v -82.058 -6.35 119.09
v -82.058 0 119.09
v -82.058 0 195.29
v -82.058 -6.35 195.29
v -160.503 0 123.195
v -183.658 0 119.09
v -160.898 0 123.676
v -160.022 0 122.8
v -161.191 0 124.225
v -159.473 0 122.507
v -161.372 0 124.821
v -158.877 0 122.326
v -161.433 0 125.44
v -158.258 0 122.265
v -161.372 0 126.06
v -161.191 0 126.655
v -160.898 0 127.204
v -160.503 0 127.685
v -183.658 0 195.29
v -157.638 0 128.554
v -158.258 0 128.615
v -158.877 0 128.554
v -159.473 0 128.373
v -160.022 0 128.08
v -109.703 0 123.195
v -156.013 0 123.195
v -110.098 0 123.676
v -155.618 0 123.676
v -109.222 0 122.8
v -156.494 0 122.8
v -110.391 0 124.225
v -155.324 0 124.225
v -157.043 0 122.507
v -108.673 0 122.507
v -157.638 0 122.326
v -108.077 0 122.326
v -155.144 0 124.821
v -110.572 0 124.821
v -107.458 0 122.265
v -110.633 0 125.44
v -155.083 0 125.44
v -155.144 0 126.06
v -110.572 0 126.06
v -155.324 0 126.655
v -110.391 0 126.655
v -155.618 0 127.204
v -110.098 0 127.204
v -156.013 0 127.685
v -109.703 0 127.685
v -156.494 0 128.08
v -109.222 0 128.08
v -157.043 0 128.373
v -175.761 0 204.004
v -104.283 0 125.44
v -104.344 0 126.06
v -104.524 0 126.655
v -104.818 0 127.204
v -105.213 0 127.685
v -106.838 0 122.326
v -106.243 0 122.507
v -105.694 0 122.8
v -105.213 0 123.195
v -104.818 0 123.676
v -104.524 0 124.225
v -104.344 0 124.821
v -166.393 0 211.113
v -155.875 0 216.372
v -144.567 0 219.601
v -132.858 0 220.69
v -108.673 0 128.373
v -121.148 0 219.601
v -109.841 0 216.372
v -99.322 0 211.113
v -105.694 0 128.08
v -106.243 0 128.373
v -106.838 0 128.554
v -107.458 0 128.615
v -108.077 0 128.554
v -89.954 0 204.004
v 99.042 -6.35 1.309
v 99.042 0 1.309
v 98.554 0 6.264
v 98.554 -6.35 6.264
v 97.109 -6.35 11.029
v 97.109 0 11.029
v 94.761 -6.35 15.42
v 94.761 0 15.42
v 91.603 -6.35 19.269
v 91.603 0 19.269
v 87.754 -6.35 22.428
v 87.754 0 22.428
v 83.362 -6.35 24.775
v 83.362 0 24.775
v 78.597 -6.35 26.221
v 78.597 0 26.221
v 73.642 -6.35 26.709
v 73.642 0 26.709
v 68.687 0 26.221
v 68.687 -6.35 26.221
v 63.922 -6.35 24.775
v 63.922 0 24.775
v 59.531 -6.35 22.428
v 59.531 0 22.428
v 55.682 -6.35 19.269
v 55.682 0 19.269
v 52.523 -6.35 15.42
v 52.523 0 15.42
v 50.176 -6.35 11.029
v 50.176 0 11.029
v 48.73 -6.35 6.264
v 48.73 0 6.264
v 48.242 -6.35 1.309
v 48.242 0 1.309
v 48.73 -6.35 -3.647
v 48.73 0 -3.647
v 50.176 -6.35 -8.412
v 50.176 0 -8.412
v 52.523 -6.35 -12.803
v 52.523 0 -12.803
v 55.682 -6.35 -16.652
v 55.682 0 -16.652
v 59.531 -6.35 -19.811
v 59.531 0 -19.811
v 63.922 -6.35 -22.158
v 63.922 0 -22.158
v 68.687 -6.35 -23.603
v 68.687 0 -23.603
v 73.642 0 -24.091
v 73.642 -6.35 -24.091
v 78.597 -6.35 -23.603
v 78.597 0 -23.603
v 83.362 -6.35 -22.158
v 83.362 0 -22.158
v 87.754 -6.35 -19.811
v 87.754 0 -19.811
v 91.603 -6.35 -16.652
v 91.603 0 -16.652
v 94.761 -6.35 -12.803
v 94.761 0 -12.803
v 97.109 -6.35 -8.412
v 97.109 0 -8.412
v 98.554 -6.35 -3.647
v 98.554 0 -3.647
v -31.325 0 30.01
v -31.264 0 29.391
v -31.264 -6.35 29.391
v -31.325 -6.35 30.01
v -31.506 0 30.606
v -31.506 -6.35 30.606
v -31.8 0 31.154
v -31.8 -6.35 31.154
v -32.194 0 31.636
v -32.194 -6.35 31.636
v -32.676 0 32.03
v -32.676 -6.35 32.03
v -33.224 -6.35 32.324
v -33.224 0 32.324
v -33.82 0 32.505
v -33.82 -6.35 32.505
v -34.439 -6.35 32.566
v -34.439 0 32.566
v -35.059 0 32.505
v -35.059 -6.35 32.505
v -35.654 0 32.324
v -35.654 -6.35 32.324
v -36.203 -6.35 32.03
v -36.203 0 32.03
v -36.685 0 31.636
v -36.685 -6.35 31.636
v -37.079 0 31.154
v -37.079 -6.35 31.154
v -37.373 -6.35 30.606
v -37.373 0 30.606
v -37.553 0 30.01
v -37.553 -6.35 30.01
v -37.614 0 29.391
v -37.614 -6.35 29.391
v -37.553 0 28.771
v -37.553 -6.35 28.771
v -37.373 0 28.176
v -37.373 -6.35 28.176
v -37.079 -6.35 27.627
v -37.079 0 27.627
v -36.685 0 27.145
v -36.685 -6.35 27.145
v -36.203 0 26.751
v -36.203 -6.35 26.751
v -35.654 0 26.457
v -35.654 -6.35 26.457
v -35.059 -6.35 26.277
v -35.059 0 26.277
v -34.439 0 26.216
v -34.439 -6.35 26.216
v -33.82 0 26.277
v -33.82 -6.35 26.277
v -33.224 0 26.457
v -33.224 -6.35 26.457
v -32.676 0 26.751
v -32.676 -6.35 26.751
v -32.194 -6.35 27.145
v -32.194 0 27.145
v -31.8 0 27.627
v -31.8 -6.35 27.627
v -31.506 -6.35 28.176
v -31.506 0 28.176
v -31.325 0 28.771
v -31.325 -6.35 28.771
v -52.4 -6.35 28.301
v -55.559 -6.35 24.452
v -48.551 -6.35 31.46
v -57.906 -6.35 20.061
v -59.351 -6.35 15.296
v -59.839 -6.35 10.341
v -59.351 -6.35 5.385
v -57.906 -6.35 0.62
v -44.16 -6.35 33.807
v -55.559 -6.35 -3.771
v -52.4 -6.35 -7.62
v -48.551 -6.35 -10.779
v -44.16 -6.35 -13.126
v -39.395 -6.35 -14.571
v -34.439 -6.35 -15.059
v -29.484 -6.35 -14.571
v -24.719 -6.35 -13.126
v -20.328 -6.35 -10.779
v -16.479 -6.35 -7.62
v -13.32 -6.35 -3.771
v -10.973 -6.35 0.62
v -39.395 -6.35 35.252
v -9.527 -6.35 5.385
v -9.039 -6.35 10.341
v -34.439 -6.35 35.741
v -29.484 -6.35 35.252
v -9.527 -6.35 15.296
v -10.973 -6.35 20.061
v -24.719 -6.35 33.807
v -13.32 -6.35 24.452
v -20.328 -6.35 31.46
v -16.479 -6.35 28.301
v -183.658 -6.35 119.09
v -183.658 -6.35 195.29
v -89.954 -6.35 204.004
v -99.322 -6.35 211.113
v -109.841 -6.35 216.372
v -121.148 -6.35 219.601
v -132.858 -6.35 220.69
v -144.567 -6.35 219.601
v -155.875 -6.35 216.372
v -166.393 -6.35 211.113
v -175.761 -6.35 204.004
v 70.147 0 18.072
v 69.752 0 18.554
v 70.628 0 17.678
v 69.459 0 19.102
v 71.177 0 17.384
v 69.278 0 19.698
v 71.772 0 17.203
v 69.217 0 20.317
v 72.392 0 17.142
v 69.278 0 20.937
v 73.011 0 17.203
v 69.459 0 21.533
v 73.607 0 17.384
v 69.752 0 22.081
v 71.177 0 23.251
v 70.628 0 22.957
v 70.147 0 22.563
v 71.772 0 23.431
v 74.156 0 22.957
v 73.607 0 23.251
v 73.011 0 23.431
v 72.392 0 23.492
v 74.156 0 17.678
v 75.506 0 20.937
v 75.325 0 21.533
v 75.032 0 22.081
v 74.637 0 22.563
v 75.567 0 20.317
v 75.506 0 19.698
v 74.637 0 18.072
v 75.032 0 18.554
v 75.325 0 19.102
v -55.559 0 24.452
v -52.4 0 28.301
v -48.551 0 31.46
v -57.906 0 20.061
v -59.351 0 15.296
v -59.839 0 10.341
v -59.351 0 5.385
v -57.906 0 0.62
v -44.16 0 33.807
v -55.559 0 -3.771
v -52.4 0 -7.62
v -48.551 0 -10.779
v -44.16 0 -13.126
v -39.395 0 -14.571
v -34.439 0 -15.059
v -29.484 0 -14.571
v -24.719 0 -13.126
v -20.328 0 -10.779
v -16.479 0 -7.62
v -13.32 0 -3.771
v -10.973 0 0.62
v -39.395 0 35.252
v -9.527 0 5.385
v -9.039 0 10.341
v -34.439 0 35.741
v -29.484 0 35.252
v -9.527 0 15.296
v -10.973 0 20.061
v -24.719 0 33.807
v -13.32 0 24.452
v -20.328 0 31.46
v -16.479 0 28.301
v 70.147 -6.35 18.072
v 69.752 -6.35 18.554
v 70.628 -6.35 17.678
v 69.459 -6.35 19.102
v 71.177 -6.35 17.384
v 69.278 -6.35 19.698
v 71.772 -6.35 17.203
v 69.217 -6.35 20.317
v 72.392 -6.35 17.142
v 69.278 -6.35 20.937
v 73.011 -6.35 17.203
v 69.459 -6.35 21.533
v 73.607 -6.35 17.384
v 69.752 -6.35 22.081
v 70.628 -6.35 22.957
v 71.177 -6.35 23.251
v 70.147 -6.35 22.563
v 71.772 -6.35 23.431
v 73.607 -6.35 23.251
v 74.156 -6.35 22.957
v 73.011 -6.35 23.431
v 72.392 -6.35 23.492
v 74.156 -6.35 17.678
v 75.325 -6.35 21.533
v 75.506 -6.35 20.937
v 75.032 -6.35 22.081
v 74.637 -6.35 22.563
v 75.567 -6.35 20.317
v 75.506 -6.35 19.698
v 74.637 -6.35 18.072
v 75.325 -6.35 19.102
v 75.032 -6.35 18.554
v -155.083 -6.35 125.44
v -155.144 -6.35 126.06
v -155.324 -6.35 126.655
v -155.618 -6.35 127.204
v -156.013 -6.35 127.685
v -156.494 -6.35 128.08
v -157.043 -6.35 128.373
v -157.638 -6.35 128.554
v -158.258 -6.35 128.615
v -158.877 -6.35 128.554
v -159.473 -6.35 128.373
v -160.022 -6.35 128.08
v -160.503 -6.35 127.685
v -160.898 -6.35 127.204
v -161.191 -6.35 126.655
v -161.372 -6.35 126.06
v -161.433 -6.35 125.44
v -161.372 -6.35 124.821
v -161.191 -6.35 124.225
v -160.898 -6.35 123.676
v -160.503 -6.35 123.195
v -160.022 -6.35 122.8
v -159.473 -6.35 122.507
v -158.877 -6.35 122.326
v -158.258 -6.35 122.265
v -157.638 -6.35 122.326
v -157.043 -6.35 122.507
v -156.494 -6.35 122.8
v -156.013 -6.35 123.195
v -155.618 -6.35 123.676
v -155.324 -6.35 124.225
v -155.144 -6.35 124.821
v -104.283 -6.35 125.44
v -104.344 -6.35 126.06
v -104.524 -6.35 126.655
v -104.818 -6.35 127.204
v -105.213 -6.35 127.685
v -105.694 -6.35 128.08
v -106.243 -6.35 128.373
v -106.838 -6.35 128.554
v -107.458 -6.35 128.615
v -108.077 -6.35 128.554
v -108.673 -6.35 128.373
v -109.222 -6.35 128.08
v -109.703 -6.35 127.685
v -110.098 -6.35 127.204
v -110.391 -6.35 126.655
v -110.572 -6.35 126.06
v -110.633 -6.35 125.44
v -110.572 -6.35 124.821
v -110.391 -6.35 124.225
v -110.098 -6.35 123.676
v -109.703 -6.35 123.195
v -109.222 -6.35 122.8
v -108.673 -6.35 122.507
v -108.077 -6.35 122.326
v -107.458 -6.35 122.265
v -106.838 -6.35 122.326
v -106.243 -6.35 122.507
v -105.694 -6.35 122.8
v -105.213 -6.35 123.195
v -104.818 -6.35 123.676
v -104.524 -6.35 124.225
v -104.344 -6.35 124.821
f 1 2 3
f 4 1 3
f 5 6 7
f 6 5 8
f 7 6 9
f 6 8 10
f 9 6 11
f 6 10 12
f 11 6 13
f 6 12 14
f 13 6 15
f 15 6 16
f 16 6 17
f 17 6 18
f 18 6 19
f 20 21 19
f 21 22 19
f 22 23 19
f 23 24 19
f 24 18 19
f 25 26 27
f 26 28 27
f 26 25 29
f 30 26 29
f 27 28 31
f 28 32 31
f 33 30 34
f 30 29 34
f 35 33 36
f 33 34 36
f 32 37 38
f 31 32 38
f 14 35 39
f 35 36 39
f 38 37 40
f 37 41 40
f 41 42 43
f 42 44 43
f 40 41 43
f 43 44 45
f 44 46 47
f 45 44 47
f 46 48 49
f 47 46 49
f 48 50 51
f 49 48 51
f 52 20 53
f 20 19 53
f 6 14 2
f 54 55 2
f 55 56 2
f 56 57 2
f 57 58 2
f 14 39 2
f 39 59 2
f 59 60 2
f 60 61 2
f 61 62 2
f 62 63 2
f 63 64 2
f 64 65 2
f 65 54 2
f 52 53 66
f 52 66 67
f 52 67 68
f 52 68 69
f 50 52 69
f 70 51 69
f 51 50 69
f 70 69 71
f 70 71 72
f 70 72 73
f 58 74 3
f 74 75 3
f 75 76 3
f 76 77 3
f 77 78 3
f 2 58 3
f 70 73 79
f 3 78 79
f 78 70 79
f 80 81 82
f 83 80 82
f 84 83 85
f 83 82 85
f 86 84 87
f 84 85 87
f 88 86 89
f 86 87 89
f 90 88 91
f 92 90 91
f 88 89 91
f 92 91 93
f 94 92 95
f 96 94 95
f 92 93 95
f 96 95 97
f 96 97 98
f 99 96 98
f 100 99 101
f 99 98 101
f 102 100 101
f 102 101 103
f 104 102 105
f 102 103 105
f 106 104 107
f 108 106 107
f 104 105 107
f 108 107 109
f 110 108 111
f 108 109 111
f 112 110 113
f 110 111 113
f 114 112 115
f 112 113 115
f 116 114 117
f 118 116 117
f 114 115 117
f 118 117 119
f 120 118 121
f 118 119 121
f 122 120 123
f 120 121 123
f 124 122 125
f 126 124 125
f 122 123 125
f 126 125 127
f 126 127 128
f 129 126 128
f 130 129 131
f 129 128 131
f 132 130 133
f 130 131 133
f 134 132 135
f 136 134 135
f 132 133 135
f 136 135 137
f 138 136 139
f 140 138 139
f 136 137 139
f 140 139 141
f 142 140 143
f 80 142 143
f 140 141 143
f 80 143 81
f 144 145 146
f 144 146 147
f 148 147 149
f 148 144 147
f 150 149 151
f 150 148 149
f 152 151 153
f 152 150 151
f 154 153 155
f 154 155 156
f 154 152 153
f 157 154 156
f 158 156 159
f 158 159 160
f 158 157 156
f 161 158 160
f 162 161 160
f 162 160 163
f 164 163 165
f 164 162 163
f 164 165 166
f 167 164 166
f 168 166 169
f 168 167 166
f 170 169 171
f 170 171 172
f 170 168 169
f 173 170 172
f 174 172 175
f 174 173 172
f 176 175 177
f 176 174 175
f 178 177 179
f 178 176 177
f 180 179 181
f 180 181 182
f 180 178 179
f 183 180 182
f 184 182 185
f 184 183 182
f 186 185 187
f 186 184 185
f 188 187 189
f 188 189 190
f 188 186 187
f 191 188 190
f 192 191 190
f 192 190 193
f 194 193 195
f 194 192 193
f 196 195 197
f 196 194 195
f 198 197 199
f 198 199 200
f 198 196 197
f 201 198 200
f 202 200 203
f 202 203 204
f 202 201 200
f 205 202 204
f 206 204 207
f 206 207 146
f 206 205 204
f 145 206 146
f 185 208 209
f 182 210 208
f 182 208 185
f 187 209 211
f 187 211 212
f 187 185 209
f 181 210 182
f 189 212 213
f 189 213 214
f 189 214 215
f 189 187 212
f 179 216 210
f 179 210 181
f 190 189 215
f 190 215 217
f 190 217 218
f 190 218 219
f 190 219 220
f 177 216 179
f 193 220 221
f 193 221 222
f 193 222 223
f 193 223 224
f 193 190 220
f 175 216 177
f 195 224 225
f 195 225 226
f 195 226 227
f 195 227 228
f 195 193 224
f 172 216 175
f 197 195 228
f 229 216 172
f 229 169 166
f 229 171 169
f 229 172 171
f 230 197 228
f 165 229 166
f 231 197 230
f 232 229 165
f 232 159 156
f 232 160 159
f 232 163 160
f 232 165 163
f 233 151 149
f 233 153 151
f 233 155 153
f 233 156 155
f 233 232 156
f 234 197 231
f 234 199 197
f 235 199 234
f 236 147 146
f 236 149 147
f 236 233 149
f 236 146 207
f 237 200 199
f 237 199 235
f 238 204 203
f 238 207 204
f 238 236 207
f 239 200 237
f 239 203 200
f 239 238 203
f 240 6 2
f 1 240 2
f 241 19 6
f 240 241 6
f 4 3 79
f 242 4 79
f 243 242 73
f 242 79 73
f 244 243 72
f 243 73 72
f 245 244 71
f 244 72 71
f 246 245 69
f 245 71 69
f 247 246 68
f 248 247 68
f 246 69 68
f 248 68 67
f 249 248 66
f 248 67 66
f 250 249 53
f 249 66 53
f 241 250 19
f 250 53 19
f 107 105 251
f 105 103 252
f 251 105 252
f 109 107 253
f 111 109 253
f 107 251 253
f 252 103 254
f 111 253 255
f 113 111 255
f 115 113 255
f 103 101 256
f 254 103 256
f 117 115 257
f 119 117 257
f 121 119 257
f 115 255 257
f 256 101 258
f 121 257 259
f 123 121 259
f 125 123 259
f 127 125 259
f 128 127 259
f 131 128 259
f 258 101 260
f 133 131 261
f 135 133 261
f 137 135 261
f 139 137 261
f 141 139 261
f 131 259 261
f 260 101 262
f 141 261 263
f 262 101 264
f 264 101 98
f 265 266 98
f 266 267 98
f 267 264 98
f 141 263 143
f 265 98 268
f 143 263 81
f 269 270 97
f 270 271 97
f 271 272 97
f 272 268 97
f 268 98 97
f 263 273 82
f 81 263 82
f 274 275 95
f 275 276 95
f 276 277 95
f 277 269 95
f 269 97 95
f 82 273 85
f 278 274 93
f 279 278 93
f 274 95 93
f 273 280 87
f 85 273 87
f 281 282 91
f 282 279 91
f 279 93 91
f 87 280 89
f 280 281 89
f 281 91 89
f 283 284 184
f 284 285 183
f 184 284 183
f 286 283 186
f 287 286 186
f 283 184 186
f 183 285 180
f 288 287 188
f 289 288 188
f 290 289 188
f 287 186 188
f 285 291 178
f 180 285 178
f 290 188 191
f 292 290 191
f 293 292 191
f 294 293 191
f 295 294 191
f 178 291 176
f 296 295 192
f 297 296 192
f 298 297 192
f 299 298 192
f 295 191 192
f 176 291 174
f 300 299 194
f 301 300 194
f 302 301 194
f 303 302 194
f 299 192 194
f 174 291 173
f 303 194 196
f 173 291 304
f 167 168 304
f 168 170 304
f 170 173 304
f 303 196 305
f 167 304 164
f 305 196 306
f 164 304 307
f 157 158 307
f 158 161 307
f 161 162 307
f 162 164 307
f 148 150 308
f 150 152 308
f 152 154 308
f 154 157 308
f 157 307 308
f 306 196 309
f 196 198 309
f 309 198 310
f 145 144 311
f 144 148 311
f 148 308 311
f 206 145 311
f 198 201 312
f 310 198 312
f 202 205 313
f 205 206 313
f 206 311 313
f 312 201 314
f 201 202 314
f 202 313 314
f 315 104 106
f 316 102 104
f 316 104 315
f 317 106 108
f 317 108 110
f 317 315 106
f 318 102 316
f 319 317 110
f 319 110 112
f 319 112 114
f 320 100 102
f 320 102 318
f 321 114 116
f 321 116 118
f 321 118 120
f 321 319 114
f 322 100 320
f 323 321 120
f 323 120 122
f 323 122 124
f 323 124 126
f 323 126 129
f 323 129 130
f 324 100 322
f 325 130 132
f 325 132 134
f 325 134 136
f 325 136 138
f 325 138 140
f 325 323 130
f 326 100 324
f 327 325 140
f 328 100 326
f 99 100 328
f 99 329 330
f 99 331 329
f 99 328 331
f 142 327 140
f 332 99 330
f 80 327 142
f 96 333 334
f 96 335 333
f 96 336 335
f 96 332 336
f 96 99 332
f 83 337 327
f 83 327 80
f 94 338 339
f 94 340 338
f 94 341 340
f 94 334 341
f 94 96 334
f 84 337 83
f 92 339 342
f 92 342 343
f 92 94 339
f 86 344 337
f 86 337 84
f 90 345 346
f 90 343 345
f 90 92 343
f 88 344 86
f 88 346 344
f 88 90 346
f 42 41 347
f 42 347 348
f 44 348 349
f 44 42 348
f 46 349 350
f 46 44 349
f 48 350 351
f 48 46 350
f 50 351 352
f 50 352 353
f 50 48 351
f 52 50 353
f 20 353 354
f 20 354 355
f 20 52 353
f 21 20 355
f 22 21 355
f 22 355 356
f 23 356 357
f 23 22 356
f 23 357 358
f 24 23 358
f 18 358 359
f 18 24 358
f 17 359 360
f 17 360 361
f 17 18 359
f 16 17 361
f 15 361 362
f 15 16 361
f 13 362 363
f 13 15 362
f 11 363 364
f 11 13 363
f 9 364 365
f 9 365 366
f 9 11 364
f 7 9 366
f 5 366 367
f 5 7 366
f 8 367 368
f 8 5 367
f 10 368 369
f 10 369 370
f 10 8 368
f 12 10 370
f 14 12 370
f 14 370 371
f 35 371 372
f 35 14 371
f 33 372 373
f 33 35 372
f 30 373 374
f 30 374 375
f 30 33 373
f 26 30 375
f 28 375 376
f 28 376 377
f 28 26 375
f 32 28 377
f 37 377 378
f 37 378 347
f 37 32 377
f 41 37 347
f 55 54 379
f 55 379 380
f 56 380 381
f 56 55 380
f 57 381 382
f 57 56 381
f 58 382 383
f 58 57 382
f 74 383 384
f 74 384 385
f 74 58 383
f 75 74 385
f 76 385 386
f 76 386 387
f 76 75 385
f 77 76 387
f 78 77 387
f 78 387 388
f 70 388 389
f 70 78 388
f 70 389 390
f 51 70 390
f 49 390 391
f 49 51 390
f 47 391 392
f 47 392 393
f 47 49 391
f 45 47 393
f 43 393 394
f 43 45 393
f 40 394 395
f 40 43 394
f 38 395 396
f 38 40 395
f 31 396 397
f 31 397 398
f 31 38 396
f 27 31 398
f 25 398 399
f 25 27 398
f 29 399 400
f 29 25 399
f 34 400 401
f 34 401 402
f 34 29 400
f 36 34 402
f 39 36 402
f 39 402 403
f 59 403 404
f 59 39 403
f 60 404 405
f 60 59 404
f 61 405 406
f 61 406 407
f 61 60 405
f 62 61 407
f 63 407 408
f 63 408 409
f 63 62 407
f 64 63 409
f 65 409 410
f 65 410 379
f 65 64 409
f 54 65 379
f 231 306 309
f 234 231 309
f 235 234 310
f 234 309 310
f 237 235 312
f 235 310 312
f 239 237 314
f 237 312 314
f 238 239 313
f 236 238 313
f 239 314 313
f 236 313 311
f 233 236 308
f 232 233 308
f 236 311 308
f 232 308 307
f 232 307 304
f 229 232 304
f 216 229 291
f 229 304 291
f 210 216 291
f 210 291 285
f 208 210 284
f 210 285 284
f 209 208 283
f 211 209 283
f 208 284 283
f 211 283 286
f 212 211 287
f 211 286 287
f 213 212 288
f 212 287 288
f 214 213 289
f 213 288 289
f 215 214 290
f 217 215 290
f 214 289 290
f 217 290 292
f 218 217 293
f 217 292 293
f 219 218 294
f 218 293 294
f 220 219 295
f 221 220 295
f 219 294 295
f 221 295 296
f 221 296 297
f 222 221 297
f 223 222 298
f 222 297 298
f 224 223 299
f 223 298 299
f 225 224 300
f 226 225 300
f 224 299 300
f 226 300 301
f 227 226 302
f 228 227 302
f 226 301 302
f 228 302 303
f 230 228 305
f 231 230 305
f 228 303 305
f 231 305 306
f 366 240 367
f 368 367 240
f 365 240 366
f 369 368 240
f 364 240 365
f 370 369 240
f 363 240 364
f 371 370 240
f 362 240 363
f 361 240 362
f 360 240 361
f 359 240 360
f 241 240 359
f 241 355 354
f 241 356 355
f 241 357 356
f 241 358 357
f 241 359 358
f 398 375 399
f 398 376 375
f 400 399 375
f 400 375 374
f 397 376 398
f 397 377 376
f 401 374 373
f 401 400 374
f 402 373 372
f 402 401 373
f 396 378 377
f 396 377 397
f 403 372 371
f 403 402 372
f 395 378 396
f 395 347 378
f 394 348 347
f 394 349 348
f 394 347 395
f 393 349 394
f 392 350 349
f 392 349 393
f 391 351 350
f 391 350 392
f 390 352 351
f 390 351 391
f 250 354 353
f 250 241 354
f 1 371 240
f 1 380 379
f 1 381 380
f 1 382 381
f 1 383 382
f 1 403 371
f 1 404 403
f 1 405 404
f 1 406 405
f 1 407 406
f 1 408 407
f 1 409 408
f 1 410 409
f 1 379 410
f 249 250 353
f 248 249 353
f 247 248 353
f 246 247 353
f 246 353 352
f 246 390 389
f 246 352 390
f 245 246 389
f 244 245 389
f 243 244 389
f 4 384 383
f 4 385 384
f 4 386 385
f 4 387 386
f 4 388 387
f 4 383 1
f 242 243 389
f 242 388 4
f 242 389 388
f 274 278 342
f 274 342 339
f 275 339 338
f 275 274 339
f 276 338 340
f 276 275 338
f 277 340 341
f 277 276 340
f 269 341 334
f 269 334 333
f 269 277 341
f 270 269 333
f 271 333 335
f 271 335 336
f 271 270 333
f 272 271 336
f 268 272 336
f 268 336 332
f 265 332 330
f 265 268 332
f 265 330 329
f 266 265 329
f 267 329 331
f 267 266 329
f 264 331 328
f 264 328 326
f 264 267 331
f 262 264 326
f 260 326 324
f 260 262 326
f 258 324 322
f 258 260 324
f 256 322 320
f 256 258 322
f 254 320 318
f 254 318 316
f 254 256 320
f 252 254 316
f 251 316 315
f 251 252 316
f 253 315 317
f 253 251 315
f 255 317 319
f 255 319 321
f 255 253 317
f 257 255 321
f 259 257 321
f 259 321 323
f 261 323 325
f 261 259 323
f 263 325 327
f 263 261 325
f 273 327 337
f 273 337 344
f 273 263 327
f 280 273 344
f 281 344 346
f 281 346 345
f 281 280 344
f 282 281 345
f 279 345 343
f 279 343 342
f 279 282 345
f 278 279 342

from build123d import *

# Parameters (mm, degrees)
F0_R     = 3.175
F1_DEPTH = 6.35
F0_R_2   = 25.4


# Not quite as in the source:
# - a feature names something its author has since deleted; it is built from what else it names


with BuildPart() as f1:
    # F0 (on Front) → F1 (new body)
    with BuildSketch(Plane.XZ):
        with BuildLine():
            Line((-183.6576171661, 195.2901095029), (-183.6576171661, 119.0901095029))
            Line((-183.6576171661, 119.0901095029), (-82.0576171661, 119.0901095029))
            Line((-82.0576171661, 119.0901095029), (-82.0576171661, 195.2901095029))
            ThreePointArc((-82.0576171661, 195.2901095029), (-132.8576171661, 220.6901095029), (-183.6576171661, 195.2901095029))
        make_face()
        with Locations((-158.2576171661, 125.4401095029)):
            Circle(F0_R, mode=Mode.SUBTRACT)
        with Locations((-107.4576171661, 125.4401095029)):
            Circle(F0_R, mode=Mode.SUBTRACT)
    extrude(amount=F1_DEPTH)


with BuildPart() as f1b:
    # F0 (on Front) → F1, piece 2 (new body)
    with BuildSketch(Plane.XZ):
        with Locations((-34.4394389217, 10.3405317959)):
            Circle(F0_R_2)
        with Locations((-34.4394389217, 29.3905317959)):
            Circle(F0_R, mode=Mode.SUBTRACT)
    extrude(amount=F1_DEPTH)


with BuildPart() as f1c:
    # F0 (on Front) → F1, piece 3 (new body)
    with BuildSketch(Plane.XZ):
        with Locations((73.6421495676, 1.3085657265)):
            Circle(F0_R_2)
        with Locations((72.3918600443, 20.3174919484)):
            Circle(F0_R, mode=Mode.SUBTRACT)
    extrude(amount=F1_DEPTH)


solid = Compound([f1.part, f1b.part, f1c.part])
